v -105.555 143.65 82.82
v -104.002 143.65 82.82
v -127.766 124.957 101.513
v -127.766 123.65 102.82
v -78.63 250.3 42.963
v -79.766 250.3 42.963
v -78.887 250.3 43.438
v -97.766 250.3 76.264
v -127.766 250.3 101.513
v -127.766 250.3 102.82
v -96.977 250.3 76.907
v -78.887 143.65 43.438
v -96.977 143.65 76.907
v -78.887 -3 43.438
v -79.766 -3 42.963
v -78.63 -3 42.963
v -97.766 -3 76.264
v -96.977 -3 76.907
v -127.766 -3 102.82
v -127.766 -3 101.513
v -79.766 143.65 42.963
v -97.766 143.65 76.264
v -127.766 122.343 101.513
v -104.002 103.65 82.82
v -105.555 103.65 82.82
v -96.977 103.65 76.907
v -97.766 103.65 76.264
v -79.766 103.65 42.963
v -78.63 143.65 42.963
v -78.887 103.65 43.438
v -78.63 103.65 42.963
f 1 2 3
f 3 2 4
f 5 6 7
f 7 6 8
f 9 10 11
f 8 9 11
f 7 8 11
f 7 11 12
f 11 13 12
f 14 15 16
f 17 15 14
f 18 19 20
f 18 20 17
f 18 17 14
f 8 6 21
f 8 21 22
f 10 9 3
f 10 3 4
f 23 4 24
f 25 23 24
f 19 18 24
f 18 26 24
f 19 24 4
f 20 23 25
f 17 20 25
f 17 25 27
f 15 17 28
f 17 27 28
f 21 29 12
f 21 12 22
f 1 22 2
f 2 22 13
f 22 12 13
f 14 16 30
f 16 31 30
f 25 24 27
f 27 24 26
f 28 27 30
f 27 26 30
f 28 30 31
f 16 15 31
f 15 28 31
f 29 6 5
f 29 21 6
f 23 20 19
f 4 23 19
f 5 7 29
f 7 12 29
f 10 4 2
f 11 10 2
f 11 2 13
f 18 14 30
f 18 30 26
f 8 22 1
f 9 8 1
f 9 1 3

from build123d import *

# Parameters (mm, degrees)
F1_DEPTH  = 247.3
F3_DEPTH  = 300
F4_DEPTH  = 61.9
F5_DEPTH  = 40
F7_DEPTH  = 300
F8_DEPTH  = 300
F10_DEPTH = 300
F11_DEPTH = 25
F12_DEPTH = 71.4
F13_DEPTH = 3
F14_DEPTH = 65.7
F15_DEPTH = 82.2
F2_W      = 20
F2_H      = 39.8570230463
F16_DEPTH = 52.6
F17_DEPTH = 121.6
F18_DEPTH = 3
F20_DEPTH = 25


# Not quite as in the source:
# - a feature of the source that left no trace in its solid (it failed there, or was rolled back) is left out
# - a feature names something its author has since deleted; it is built from what else it names


with BuildPart() as f1:
    # F0 (on Front) → F1 (new body)
    with BuildSketch(Plane.XZ):
        Polygon((-78.8866152354, 43.4383174348), (-78.6296018241, 42.9628188217), (-78.6296018241, 102.819841868), (-127.7663317061, 102.819841868), (-96.9769939736, 76.9071934711), align=None)
        Polygon((-79.7663317061, 42.9628188217), (-97.7663317061, 76.264485822), (-127.7663317061, 101.5128188217), (-157.7663317061, 76.264485822), (-175.7663317061, 42.9628188217), align=None)
        Polygon((-127.7663317061, 101.5128188217), (-97.7663317061, 76.264485822), (-79.7663317061, 42.9628188217), (-78.6296018241, 42.9628188217), (-78.8866152354, 43.4383174348), (-96.9769939736, 76.9071934711), (-127.7663317061, 102.819841868), (-158.5556694386, 76.9071934711), (-176.9030615881, 42.9628188217), (-175.7663317061, 42.9628188217), (-157.7663317061, 76.264485822), align=None)
        Polygon((-176.9030615881, 102.819841868), (-176.9030615881, 42.9628188217), (-158.5556694386, 76.9071934711), (-127.7663317061, 102.819841868), align=None)
    extrude(amount=-F1_DEPTH)

    # F0 (on Front) → F3 (cut)
    with BuildSketch(Plane.XZ):
        Polygon((-78.8866152354, 43.4383174348), (-78.6296018241, 42.9628188217), (-78.6296018241, 102.819841868), (-127.7663317061, 102.819841868), (-96.9769939736, 76.9071934711), align=None)
    extrude(amount=-F3_DEPTH, mode=Mode.SUBTRACT)

    # F2 (on face) → F4 (join)
    with BuildSketch(Plane.YZ.offset(-78.6296018241)):
        Polygon((123.65, 84.6090763807), (123.65, 102.819841868), (103.65, 82.819841868), (123.65, 82.819841868), align=None)
    extrude(amount=-F4_DEPTH)

    # F5 (add): a face of the model
    f5_faces = [f1.faces().sort_by_distance(p)[0] for p in [
        (-91.3159942007, 113.65, 82.819841868),
    ]]
    extrude(f5_faces, amount=F5_DEPTH)

    # F0 (on Front) → F7 (cut)
    with BuildSketch(Plane.XZ):
        Polygon((-79.7663317061, 42.9628188217), (-97.7663317061, 76.264485822), (-127.7663317061, 101.5128188217), (-157.7663317061, 76.264485822), (-175.7663317061, 42.9628188217), align=None)
    extrude(amount=-F7_DEPTH, mode=Mode.SUBTRACT)

    # F0 (on Front) → F8 (cut)
    with BuildSketch(Plane.XZ):
        Polygon((-176.9030615881, 102.819841868), (-176.9030615881, 42.9628188217), (-158.5556694386, 76.9071934711), (-127.7663317061, 102.819841868), align=None)
    extrude(amount=-F8_DEPTH, mode=Mode.SUBTRACT)

    # F9 (on face) → F10 (cut)
    with BuildSketch(Plane.XZ):
        Polygon((-127.7663317061, 101.5128188217), (-127.7663317061, 102.819841868), (-158.5556694386, 76.9071934711), (-176.9030615881, 42.9628188217), (-175.7663317061, 42.9628188217), (-157.7663317061, 76.264485822), align=None)
    extrude(amount=-F10_DEPTH, mode=Mode.SUBTRACT)

    # F11 (cut): a face of the model
    f11_faces = [f1.faces().sort_by_distance(p)[0] for p in [
        (-78.6296018241, 114.3166666667, 68.1531752014),
    ]]
    extrude(f11_faces, amount=-F11_DEPTH, mode=Mode.SUBTRACT)

    # F12 (cut): faces of the model
    f12_faces = [f1.faces().sort_by_distance(p)[0] for p in [
        (-103.6296018241, 116.5184290192, 88.4436749614),
        (-103.6296018241, 113.65, 42.8913303449),
    ]]
    extrude(f12_faces, amount=-F12_DEPTH, mode=Mode.SUBTRACT)

    # F0 (on Front) → F13 (join)
    with BuildSketch(Plane.XZ):
        Polygon((-127.7663317061, 101.5128188217), (-97.7663317061, 76.264485822), (-79.7663317061, 42.9628188217), (-78.6296018241, 42.9628188217), (-78.8866152354, 43.4383174348), (-96.9769939736, 76.9071934711), (-127.7663317061, 102.819841868), (-158.5556694386, 76.9071934711), (-176.9030615881, 42.9628188217), (-175.7663317061, 42.9628188217), (-157.7663317061, 76.264485822), align=None)
    extrude(amount=F13_DEPTH)

    # F2 (on face) → F14 (join)
    with BuildSketch(Plane.YZ.offset(-78.6296018241)):
        Polygon((143.65, 82.819841868), (123.65, 102.819841868), (123.65, 84.6090763807), (123.65, 82.819841868), align=None)
    extrude(amount=-F14_DEPTH)

    # F2 (on face) → F15 (cut)
    with BuildSketch(Plane.YZ.offset(-78.6296018241)):
        Polygon((143.65, 82.819841868), (123.65, 102.819841868), (123.65, 84.6090763807), (123.65, 82.819841868), align=None)
    extrude(amount=-F15_DEPTH, mode=Mode.SUBTRACT)

    # F2 (on face) → F16 (join)
    with BuildSketch(Plane.YZ.offset(-78.6296018241)):
        with Locations((133.65, 62.8913303449)):
            Rectangle(F2_W, F2_H)
    extrude(amount=-F16_DEPTH)

    # F2 (on face) → F17 (cut)
    with BuildSketch(Plane.YZ.offset(-78.6296018241)):
        with Locations((133.65, 62.8913303449)):
            Rectangle(F2_W, F2_H)
    extrude(amount=-F17_DEPTH, mode=Mode.SUBTRACT)

    # F18 (add): a face of the model
    f18_faces = [f1.faces().sort_by_distance(p)[0] for p in [
        (-112.8703238632, 247.3, 89.2710100097),
    ]]
    extrude(f18_faces, amount=F18_DEPTH)

    # F19 (on face) → F20 (cut)
    with BuildSketch(Plane.XZ.offset(3)):
        Polygon((-127.7663317061, 101.5128188217), (-127.7663317061, 102.819841868), (-158.5556694386, 76.9071934711), (-176.9030615881, 42.9628188217), (-175.7663317061, 42.9628188217), (-157.7663317061, 76.264485822), align=None)
    extrude(amount=-F20_DEPTH, mode=Mode.SUBTRACT)


solid = f1.part
